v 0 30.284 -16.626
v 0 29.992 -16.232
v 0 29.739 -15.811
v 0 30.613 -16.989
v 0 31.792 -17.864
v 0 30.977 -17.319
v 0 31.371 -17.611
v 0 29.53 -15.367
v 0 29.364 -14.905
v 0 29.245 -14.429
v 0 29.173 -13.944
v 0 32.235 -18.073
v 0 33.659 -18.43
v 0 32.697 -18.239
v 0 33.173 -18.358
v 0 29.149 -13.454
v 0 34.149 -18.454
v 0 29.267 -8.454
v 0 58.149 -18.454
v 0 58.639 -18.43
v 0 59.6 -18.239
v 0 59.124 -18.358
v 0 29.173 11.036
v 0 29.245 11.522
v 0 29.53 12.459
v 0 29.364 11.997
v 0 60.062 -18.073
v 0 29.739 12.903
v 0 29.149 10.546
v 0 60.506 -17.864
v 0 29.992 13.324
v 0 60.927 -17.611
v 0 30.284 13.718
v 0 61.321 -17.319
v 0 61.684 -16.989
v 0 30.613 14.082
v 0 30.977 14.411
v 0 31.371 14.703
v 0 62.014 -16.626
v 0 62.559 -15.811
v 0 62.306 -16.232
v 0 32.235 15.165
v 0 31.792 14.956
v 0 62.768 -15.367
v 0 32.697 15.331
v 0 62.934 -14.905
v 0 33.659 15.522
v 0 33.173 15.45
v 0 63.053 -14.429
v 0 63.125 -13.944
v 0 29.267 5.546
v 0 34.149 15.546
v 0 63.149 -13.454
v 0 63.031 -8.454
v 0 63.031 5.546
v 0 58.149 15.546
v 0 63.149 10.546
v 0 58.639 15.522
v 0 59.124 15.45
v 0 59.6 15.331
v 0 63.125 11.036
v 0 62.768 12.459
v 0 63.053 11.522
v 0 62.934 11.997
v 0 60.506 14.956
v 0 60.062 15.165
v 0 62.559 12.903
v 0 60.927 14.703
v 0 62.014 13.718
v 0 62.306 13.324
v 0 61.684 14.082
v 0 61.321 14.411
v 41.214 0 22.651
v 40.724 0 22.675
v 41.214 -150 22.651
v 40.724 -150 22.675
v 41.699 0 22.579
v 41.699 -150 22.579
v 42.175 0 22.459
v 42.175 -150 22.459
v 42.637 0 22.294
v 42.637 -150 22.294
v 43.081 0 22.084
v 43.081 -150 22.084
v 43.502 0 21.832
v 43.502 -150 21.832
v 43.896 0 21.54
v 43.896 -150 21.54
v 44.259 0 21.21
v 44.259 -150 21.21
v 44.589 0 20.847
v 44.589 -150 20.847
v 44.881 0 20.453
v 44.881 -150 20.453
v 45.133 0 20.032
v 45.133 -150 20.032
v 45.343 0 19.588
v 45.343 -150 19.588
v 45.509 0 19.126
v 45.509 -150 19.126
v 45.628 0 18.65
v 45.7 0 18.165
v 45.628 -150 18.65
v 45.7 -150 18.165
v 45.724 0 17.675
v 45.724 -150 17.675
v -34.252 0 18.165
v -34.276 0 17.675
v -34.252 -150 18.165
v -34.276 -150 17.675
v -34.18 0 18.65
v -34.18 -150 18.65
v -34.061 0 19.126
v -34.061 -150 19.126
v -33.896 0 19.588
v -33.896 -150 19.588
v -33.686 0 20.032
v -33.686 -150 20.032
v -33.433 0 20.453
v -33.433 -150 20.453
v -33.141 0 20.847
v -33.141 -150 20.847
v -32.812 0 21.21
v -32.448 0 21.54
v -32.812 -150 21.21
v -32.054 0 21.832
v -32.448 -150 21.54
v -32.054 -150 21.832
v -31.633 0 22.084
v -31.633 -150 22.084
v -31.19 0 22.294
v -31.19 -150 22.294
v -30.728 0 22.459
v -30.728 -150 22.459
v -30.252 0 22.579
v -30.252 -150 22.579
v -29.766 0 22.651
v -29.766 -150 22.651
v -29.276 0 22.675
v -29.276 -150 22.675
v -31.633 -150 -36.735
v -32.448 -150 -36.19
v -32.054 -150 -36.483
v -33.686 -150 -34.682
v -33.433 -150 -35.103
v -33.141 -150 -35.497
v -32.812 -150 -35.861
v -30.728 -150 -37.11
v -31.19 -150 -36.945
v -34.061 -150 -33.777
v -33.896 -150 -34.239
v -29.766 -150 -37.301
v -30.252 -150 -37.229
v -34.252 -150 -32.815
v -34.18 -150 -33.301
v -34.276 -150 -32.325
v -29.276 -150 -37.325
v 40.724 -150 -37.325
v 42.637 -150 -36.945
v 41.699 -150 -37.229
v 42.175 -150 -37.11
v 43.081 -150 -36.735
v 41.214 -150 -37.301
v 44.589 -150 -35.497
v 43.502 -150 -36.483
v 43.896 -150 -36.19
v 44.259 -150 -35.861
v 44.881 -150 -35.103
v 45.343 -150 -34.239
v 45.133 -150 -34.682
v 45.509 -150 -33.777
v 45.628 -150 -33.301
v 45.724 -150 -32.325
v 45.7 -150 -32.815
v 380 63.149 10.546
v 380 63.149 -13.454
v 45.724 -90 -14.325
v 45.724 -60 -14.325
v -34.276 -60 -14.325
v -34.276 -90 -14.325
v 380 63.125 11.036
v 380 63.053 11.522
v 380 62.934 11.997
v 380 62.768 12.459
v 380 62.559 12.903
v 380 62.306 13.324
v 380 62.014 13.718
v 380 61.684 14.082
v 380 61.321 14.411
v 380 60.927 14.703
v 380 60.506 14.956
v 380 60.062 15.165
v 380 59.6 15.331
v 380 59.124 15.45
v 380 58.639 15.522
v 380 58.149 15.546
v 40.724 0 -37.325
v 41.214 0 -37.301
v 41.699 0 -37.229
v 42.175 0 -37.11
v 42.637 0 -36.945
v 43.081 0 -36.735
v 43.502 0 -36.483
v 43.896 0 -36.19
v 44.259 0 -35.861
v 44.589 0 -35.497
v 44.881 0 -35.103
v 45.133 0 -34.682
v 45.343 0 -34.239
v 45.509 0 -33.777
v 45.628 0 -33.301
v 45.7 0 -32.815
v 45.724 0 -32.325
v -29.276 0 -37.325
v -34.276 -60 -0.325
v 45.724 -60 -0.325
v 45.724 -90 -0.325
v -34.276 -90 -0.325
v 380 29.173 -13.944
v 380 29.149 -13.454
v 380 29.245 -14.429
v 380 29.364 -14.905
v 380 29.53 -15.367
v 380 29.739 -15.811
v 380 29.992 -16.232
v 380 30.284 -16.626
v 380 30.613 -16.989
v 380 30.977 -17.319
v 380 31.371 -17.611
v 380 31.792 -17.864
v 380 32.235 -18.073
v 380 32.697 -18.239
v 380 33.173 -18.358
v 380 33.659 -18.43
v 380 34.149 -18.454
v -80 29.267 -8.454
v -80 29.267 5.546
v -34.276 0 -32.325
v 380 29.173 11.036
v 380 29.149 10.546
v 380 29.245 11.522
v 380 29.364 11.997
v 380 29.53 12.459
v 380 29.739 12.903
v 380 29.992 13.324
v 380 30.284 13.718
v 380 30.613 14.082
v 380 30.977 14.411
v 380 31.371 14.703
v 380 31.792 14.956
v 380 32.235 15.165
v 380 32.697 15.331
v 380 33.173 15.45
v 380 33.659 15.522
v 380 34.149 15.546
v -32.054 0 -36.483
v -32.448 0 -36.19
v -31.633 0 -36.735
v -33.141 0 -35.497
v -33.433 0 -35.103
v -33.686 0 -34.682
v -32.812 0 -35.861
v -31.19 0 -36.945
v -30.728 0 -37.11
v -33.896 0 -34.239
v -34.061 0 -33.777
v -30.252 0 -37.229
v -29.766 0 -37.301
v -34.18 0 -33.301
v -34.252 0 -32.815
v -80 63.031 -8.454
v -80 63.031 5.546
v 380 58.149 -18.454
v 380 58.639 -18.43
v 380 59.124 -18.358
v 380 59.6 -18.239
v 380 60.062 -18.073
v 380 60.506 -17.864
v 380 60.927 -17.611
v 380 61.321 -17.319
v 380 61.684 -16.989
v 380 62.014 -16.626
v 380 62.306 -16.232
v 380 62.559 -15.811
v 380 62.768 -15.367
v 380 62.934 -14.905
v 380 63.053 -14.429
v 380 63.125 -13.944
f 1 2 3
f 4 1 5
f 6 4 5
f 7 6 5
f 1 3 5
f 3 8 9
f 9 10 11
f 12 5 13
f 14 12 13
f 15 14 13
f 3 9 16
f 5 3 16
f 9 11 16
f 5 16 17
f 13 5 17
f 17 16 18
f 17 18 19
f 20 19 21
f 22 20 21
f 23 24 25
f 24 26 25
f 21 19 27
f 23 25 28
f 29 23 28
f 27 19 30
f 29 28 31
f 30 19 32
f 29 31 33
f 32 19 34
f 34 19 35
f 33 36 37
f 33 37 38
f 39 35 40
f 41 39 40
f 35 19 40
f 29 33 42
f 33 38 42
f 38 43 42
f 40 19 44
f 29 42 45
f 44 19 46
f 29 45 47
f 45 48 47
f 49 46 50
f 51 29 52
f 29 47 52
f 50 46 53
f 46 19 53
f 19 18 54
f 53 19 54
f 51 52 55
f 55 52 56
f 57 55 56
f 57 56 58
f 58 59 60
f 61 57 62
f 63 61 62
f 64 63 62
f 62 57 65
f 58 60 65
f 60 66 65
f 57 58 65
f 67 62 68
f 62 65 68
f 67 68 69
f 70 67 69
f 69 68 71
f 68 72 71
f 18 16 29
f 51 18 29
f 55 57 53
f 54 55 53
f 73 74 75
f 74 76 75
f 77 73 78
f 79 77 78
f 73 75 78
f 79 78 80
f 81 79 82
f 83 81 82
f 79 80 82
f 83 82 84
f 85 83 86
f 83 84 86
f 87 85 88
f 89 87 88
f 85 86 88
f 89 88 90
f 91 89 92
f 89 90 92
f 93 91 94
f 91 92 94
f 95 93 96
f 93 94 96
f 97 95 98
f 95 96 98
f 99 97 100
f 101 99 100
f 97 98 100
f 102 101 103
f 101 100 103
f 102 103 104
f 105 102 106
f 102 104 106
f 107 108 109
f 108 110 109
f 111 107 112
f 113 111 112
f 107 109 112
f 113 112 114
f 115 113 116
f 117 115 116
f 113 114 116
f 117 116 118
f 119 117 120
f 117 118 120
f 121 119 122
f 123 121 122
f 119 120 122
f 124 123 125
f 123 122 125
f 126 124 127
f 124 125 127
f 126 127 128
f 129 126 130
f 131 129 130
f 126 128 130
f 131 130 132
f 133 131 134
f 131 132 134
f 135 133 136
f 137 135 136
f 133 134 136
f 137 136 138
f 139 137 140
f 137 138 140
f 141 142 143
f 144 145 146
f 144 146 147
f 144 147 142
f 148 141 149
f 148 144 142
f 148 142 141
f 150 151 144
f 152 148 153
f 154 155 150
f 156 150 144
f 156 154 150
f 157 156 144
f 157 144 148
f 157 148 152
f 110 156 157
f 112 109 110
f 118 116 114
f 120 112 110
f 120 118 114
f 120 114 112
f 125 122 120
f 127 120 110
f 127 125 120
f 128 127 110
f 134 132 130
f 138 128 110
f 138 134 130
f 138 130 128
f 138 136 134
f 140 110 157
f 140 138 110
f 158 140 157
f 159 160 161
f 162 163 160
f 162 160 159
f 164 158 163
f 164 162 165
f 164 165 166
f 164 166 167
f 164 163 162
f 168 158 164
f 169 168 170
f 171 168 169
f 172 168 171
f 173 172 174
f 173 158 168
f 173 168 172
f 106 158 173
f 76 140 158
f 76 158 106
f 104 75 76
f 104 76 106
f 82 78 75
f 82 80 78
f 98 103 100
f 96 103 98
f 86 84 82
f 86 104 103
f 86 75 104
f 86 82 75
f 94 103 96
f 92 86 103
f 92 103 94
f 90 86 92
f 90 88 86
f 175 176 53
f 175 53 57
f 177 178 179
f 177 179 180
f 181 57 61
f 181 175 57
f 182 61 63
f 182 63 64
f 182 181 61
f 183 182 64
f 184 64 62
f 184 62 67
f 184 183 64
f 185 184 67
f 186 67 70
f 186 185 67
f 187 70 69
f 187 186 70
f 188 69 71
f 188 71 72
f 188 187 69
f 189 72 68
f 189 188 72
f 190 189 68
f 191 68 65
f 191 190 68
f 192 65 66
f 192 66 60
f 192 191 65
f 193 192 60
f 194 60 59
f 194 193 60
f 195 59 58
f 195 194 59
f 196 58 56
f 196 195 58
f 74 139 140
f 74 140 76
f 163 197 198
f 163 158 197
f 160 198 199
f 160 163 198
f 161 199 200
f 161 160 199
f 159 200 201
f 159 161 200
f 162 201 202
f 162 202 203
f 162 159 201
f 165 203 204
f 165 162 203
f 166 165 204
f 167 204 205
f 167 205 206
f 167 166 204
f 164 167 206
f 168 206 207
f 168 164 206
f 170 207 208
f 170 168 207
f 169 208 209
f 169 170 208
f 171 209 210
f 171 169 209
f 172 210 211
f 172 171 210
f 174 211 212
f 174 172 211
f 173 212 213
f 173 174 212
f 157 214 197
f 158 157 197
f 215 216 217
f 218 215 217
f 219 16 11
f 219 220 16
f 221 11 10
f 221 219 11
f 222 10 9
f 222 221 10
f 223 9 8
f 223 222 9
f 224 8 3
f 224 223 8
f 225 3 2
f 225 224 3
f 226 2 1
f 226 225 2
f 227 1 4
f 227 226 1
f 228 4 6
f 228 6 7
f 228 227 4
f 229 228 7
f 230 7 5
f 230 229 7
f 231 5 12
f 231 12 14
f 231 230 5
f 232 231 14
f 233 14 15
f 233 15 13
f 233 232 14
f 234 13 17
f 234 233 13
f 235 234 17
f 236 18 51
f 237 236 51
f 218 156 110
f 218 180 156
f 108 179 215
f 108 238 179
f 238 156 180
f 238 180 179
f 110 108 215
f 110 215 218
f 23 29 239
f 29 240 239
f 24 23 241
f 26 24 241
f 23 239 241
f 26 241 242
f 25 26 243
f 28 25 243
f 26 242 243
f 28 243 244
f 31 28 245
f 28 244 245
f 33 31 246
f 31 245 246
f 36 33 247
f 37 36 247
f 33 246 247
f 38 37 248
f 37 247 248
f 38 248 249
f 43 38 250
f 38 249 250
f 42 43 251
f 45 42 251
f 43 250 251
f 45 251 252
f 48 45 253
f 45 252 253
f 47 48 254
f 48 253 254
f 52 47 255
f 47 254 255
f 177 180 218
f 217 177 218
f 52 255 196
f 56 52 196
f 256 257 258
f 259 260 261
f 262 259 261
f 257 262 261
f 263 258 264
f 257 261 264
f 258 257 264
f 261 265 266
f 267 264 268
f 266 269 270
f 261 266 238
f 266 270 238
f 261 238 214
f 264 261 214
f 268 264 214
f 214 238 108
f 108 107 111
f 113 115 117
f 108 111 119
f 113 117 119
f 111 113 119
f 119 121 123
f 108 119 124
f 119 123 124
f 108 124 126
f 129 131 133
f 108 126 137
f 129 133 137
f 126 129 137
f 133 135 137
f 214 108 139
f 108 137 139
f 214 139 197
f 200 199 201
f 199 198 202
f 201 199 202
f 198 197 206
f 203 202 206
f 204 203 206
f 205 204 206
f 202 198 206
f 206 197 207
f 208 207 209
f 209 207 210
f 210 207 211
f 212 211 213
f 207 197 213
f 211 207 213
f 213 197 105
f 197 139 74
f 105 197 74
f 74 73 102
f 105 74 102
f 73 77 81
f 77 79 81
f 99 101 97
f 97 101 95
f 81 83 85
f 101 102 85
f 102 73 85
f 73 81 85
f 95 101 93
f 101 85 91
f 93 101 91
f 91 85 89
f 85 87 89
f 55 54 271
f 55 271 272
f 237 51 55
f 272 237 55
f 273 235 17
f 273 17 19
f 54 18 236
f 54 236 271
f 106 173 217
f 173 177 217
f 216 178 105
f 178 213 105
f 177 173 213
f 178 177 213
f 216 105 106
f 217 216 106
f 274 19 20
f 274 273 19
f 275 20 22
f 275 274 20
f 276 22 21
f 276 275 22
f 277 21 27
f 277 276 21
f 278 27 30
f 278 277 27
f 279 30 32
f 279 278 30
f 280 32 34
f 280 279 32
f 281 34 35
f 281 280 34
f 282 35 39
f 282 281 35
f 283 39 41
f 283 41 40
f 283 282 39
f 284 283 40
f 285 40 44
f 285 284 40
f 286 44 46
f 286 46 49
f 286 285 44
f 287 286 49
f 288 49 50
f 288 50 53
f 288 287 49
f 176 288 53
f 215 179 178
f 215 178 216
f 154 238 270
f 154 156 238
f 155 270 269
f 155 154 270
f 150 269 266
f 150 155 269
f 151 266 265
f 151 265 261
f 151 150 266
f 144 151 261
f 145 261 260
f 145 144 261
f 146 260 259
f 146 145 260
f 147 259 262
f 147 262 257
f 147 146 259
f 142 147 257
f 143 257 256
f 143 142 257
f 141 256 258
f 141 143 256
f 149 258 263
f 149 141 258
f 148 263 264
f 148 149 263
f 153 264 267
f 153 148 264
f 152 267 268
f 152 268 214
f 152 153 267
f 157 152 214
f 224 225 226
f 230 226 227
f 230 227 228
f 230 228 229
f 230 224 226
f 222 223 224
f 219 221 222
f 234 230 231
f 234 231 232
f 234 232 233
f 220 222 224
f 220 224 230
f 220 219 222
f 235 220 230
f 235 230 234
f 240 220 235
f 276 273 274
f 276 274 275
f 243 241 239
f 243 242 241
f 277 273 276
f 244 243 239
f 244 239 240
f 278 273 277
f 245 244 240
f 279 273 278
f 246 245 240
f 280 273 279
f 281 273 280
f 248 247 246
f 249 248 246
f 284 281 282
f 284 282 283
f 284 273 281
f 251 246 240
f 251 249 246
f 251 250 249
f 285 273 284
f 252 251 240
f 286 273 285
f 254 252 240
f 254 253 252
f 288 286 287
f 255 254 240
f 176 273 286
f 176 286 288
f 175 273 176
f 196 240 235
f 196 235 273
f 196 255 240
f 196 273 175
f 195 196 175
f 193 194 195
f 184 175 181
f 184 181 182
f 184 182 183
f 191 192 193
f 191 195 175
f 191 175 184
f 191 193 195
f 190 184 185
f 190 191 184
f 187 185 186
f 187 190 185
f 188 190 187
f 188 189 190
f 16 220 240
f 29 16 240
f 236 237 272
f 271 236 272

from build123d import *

# Parameters (mm, degrees)
F0_W     = 80
F0_H     = 60
F1_DEPTH = 150
F2_W     = 30
F2_H     = 14
F3_DEPTH = 80.001
F4_W     = 34
F4_H     = 34
F5_DEPTH = 380
F6_R     = 5
F6_2_R   = 5
F7_W     = 33.764725
F7_H     = 14
F8_DEPTH = 80


with BuildPart() as f1:
    # F0 (on Front) → F1 (new body)
    with BuildSketch(Plane.XZ):
        with Locations((5.723887, -7.325317)):
            Rectangle(F0_W, F0_H)
    extrude(amount=F1_DEPTH)

    # F2 (on face) → F3 (cut, through all)
    with BuildSketch(Plane(origin=(-34.276113, 0, 0), x_dir=(0, -1, 0), z_dir=(-1, 0, 0))):
        with Locations((75, -7.325317)):
            Rectangle(F2_W, F2_H)
    extrude(amount=-F3_DEPTH, mode=Mode.SUBTRACT)

    # F6#2
    f6_2_edges = [f1.edges().sort_by_distance(p)[0] for p in [
        (45.723887, -75, -37.325317),
        (-34.276113, -75, -37.325317),
        (-34.276113, -75, 22.674683),
        (45.723887, -75, 22.674683),
    ]]
    fillet(f6_2_edges, radius=F6_2_R)


with BuildPart() as f5:
    # F4 (on Right) → F5 (new body)
    with BuildSketch(Plane.YZ):
        with Locations((46.148908, -1.453934)):
            Rectangle(F4_W, F4_H)
    extrude(amount=F5_DEPTH)

    # F6
    f6_edges = [f5.edges().sort_by_distance(p)[0] for p in [
        (190, 63.148908, 15.546066),
        (190, 29.148908, 15.546066),
        (190, 29.148908, -18.453934),
        (190, 63.148908, -18.453934),
    ]]
    fillet(f6_edges, radius=F6_R)

    # F7 (on face) → F8 (join)
    with BuildSketch(Plane.YZ):
        with Locations((46.148908, -1.453934)):
            Rectangle(F7_W, F7_H)
    extrude(amount=-F8_DEPTH)


solid = Compound([f1.part, f5.part])
